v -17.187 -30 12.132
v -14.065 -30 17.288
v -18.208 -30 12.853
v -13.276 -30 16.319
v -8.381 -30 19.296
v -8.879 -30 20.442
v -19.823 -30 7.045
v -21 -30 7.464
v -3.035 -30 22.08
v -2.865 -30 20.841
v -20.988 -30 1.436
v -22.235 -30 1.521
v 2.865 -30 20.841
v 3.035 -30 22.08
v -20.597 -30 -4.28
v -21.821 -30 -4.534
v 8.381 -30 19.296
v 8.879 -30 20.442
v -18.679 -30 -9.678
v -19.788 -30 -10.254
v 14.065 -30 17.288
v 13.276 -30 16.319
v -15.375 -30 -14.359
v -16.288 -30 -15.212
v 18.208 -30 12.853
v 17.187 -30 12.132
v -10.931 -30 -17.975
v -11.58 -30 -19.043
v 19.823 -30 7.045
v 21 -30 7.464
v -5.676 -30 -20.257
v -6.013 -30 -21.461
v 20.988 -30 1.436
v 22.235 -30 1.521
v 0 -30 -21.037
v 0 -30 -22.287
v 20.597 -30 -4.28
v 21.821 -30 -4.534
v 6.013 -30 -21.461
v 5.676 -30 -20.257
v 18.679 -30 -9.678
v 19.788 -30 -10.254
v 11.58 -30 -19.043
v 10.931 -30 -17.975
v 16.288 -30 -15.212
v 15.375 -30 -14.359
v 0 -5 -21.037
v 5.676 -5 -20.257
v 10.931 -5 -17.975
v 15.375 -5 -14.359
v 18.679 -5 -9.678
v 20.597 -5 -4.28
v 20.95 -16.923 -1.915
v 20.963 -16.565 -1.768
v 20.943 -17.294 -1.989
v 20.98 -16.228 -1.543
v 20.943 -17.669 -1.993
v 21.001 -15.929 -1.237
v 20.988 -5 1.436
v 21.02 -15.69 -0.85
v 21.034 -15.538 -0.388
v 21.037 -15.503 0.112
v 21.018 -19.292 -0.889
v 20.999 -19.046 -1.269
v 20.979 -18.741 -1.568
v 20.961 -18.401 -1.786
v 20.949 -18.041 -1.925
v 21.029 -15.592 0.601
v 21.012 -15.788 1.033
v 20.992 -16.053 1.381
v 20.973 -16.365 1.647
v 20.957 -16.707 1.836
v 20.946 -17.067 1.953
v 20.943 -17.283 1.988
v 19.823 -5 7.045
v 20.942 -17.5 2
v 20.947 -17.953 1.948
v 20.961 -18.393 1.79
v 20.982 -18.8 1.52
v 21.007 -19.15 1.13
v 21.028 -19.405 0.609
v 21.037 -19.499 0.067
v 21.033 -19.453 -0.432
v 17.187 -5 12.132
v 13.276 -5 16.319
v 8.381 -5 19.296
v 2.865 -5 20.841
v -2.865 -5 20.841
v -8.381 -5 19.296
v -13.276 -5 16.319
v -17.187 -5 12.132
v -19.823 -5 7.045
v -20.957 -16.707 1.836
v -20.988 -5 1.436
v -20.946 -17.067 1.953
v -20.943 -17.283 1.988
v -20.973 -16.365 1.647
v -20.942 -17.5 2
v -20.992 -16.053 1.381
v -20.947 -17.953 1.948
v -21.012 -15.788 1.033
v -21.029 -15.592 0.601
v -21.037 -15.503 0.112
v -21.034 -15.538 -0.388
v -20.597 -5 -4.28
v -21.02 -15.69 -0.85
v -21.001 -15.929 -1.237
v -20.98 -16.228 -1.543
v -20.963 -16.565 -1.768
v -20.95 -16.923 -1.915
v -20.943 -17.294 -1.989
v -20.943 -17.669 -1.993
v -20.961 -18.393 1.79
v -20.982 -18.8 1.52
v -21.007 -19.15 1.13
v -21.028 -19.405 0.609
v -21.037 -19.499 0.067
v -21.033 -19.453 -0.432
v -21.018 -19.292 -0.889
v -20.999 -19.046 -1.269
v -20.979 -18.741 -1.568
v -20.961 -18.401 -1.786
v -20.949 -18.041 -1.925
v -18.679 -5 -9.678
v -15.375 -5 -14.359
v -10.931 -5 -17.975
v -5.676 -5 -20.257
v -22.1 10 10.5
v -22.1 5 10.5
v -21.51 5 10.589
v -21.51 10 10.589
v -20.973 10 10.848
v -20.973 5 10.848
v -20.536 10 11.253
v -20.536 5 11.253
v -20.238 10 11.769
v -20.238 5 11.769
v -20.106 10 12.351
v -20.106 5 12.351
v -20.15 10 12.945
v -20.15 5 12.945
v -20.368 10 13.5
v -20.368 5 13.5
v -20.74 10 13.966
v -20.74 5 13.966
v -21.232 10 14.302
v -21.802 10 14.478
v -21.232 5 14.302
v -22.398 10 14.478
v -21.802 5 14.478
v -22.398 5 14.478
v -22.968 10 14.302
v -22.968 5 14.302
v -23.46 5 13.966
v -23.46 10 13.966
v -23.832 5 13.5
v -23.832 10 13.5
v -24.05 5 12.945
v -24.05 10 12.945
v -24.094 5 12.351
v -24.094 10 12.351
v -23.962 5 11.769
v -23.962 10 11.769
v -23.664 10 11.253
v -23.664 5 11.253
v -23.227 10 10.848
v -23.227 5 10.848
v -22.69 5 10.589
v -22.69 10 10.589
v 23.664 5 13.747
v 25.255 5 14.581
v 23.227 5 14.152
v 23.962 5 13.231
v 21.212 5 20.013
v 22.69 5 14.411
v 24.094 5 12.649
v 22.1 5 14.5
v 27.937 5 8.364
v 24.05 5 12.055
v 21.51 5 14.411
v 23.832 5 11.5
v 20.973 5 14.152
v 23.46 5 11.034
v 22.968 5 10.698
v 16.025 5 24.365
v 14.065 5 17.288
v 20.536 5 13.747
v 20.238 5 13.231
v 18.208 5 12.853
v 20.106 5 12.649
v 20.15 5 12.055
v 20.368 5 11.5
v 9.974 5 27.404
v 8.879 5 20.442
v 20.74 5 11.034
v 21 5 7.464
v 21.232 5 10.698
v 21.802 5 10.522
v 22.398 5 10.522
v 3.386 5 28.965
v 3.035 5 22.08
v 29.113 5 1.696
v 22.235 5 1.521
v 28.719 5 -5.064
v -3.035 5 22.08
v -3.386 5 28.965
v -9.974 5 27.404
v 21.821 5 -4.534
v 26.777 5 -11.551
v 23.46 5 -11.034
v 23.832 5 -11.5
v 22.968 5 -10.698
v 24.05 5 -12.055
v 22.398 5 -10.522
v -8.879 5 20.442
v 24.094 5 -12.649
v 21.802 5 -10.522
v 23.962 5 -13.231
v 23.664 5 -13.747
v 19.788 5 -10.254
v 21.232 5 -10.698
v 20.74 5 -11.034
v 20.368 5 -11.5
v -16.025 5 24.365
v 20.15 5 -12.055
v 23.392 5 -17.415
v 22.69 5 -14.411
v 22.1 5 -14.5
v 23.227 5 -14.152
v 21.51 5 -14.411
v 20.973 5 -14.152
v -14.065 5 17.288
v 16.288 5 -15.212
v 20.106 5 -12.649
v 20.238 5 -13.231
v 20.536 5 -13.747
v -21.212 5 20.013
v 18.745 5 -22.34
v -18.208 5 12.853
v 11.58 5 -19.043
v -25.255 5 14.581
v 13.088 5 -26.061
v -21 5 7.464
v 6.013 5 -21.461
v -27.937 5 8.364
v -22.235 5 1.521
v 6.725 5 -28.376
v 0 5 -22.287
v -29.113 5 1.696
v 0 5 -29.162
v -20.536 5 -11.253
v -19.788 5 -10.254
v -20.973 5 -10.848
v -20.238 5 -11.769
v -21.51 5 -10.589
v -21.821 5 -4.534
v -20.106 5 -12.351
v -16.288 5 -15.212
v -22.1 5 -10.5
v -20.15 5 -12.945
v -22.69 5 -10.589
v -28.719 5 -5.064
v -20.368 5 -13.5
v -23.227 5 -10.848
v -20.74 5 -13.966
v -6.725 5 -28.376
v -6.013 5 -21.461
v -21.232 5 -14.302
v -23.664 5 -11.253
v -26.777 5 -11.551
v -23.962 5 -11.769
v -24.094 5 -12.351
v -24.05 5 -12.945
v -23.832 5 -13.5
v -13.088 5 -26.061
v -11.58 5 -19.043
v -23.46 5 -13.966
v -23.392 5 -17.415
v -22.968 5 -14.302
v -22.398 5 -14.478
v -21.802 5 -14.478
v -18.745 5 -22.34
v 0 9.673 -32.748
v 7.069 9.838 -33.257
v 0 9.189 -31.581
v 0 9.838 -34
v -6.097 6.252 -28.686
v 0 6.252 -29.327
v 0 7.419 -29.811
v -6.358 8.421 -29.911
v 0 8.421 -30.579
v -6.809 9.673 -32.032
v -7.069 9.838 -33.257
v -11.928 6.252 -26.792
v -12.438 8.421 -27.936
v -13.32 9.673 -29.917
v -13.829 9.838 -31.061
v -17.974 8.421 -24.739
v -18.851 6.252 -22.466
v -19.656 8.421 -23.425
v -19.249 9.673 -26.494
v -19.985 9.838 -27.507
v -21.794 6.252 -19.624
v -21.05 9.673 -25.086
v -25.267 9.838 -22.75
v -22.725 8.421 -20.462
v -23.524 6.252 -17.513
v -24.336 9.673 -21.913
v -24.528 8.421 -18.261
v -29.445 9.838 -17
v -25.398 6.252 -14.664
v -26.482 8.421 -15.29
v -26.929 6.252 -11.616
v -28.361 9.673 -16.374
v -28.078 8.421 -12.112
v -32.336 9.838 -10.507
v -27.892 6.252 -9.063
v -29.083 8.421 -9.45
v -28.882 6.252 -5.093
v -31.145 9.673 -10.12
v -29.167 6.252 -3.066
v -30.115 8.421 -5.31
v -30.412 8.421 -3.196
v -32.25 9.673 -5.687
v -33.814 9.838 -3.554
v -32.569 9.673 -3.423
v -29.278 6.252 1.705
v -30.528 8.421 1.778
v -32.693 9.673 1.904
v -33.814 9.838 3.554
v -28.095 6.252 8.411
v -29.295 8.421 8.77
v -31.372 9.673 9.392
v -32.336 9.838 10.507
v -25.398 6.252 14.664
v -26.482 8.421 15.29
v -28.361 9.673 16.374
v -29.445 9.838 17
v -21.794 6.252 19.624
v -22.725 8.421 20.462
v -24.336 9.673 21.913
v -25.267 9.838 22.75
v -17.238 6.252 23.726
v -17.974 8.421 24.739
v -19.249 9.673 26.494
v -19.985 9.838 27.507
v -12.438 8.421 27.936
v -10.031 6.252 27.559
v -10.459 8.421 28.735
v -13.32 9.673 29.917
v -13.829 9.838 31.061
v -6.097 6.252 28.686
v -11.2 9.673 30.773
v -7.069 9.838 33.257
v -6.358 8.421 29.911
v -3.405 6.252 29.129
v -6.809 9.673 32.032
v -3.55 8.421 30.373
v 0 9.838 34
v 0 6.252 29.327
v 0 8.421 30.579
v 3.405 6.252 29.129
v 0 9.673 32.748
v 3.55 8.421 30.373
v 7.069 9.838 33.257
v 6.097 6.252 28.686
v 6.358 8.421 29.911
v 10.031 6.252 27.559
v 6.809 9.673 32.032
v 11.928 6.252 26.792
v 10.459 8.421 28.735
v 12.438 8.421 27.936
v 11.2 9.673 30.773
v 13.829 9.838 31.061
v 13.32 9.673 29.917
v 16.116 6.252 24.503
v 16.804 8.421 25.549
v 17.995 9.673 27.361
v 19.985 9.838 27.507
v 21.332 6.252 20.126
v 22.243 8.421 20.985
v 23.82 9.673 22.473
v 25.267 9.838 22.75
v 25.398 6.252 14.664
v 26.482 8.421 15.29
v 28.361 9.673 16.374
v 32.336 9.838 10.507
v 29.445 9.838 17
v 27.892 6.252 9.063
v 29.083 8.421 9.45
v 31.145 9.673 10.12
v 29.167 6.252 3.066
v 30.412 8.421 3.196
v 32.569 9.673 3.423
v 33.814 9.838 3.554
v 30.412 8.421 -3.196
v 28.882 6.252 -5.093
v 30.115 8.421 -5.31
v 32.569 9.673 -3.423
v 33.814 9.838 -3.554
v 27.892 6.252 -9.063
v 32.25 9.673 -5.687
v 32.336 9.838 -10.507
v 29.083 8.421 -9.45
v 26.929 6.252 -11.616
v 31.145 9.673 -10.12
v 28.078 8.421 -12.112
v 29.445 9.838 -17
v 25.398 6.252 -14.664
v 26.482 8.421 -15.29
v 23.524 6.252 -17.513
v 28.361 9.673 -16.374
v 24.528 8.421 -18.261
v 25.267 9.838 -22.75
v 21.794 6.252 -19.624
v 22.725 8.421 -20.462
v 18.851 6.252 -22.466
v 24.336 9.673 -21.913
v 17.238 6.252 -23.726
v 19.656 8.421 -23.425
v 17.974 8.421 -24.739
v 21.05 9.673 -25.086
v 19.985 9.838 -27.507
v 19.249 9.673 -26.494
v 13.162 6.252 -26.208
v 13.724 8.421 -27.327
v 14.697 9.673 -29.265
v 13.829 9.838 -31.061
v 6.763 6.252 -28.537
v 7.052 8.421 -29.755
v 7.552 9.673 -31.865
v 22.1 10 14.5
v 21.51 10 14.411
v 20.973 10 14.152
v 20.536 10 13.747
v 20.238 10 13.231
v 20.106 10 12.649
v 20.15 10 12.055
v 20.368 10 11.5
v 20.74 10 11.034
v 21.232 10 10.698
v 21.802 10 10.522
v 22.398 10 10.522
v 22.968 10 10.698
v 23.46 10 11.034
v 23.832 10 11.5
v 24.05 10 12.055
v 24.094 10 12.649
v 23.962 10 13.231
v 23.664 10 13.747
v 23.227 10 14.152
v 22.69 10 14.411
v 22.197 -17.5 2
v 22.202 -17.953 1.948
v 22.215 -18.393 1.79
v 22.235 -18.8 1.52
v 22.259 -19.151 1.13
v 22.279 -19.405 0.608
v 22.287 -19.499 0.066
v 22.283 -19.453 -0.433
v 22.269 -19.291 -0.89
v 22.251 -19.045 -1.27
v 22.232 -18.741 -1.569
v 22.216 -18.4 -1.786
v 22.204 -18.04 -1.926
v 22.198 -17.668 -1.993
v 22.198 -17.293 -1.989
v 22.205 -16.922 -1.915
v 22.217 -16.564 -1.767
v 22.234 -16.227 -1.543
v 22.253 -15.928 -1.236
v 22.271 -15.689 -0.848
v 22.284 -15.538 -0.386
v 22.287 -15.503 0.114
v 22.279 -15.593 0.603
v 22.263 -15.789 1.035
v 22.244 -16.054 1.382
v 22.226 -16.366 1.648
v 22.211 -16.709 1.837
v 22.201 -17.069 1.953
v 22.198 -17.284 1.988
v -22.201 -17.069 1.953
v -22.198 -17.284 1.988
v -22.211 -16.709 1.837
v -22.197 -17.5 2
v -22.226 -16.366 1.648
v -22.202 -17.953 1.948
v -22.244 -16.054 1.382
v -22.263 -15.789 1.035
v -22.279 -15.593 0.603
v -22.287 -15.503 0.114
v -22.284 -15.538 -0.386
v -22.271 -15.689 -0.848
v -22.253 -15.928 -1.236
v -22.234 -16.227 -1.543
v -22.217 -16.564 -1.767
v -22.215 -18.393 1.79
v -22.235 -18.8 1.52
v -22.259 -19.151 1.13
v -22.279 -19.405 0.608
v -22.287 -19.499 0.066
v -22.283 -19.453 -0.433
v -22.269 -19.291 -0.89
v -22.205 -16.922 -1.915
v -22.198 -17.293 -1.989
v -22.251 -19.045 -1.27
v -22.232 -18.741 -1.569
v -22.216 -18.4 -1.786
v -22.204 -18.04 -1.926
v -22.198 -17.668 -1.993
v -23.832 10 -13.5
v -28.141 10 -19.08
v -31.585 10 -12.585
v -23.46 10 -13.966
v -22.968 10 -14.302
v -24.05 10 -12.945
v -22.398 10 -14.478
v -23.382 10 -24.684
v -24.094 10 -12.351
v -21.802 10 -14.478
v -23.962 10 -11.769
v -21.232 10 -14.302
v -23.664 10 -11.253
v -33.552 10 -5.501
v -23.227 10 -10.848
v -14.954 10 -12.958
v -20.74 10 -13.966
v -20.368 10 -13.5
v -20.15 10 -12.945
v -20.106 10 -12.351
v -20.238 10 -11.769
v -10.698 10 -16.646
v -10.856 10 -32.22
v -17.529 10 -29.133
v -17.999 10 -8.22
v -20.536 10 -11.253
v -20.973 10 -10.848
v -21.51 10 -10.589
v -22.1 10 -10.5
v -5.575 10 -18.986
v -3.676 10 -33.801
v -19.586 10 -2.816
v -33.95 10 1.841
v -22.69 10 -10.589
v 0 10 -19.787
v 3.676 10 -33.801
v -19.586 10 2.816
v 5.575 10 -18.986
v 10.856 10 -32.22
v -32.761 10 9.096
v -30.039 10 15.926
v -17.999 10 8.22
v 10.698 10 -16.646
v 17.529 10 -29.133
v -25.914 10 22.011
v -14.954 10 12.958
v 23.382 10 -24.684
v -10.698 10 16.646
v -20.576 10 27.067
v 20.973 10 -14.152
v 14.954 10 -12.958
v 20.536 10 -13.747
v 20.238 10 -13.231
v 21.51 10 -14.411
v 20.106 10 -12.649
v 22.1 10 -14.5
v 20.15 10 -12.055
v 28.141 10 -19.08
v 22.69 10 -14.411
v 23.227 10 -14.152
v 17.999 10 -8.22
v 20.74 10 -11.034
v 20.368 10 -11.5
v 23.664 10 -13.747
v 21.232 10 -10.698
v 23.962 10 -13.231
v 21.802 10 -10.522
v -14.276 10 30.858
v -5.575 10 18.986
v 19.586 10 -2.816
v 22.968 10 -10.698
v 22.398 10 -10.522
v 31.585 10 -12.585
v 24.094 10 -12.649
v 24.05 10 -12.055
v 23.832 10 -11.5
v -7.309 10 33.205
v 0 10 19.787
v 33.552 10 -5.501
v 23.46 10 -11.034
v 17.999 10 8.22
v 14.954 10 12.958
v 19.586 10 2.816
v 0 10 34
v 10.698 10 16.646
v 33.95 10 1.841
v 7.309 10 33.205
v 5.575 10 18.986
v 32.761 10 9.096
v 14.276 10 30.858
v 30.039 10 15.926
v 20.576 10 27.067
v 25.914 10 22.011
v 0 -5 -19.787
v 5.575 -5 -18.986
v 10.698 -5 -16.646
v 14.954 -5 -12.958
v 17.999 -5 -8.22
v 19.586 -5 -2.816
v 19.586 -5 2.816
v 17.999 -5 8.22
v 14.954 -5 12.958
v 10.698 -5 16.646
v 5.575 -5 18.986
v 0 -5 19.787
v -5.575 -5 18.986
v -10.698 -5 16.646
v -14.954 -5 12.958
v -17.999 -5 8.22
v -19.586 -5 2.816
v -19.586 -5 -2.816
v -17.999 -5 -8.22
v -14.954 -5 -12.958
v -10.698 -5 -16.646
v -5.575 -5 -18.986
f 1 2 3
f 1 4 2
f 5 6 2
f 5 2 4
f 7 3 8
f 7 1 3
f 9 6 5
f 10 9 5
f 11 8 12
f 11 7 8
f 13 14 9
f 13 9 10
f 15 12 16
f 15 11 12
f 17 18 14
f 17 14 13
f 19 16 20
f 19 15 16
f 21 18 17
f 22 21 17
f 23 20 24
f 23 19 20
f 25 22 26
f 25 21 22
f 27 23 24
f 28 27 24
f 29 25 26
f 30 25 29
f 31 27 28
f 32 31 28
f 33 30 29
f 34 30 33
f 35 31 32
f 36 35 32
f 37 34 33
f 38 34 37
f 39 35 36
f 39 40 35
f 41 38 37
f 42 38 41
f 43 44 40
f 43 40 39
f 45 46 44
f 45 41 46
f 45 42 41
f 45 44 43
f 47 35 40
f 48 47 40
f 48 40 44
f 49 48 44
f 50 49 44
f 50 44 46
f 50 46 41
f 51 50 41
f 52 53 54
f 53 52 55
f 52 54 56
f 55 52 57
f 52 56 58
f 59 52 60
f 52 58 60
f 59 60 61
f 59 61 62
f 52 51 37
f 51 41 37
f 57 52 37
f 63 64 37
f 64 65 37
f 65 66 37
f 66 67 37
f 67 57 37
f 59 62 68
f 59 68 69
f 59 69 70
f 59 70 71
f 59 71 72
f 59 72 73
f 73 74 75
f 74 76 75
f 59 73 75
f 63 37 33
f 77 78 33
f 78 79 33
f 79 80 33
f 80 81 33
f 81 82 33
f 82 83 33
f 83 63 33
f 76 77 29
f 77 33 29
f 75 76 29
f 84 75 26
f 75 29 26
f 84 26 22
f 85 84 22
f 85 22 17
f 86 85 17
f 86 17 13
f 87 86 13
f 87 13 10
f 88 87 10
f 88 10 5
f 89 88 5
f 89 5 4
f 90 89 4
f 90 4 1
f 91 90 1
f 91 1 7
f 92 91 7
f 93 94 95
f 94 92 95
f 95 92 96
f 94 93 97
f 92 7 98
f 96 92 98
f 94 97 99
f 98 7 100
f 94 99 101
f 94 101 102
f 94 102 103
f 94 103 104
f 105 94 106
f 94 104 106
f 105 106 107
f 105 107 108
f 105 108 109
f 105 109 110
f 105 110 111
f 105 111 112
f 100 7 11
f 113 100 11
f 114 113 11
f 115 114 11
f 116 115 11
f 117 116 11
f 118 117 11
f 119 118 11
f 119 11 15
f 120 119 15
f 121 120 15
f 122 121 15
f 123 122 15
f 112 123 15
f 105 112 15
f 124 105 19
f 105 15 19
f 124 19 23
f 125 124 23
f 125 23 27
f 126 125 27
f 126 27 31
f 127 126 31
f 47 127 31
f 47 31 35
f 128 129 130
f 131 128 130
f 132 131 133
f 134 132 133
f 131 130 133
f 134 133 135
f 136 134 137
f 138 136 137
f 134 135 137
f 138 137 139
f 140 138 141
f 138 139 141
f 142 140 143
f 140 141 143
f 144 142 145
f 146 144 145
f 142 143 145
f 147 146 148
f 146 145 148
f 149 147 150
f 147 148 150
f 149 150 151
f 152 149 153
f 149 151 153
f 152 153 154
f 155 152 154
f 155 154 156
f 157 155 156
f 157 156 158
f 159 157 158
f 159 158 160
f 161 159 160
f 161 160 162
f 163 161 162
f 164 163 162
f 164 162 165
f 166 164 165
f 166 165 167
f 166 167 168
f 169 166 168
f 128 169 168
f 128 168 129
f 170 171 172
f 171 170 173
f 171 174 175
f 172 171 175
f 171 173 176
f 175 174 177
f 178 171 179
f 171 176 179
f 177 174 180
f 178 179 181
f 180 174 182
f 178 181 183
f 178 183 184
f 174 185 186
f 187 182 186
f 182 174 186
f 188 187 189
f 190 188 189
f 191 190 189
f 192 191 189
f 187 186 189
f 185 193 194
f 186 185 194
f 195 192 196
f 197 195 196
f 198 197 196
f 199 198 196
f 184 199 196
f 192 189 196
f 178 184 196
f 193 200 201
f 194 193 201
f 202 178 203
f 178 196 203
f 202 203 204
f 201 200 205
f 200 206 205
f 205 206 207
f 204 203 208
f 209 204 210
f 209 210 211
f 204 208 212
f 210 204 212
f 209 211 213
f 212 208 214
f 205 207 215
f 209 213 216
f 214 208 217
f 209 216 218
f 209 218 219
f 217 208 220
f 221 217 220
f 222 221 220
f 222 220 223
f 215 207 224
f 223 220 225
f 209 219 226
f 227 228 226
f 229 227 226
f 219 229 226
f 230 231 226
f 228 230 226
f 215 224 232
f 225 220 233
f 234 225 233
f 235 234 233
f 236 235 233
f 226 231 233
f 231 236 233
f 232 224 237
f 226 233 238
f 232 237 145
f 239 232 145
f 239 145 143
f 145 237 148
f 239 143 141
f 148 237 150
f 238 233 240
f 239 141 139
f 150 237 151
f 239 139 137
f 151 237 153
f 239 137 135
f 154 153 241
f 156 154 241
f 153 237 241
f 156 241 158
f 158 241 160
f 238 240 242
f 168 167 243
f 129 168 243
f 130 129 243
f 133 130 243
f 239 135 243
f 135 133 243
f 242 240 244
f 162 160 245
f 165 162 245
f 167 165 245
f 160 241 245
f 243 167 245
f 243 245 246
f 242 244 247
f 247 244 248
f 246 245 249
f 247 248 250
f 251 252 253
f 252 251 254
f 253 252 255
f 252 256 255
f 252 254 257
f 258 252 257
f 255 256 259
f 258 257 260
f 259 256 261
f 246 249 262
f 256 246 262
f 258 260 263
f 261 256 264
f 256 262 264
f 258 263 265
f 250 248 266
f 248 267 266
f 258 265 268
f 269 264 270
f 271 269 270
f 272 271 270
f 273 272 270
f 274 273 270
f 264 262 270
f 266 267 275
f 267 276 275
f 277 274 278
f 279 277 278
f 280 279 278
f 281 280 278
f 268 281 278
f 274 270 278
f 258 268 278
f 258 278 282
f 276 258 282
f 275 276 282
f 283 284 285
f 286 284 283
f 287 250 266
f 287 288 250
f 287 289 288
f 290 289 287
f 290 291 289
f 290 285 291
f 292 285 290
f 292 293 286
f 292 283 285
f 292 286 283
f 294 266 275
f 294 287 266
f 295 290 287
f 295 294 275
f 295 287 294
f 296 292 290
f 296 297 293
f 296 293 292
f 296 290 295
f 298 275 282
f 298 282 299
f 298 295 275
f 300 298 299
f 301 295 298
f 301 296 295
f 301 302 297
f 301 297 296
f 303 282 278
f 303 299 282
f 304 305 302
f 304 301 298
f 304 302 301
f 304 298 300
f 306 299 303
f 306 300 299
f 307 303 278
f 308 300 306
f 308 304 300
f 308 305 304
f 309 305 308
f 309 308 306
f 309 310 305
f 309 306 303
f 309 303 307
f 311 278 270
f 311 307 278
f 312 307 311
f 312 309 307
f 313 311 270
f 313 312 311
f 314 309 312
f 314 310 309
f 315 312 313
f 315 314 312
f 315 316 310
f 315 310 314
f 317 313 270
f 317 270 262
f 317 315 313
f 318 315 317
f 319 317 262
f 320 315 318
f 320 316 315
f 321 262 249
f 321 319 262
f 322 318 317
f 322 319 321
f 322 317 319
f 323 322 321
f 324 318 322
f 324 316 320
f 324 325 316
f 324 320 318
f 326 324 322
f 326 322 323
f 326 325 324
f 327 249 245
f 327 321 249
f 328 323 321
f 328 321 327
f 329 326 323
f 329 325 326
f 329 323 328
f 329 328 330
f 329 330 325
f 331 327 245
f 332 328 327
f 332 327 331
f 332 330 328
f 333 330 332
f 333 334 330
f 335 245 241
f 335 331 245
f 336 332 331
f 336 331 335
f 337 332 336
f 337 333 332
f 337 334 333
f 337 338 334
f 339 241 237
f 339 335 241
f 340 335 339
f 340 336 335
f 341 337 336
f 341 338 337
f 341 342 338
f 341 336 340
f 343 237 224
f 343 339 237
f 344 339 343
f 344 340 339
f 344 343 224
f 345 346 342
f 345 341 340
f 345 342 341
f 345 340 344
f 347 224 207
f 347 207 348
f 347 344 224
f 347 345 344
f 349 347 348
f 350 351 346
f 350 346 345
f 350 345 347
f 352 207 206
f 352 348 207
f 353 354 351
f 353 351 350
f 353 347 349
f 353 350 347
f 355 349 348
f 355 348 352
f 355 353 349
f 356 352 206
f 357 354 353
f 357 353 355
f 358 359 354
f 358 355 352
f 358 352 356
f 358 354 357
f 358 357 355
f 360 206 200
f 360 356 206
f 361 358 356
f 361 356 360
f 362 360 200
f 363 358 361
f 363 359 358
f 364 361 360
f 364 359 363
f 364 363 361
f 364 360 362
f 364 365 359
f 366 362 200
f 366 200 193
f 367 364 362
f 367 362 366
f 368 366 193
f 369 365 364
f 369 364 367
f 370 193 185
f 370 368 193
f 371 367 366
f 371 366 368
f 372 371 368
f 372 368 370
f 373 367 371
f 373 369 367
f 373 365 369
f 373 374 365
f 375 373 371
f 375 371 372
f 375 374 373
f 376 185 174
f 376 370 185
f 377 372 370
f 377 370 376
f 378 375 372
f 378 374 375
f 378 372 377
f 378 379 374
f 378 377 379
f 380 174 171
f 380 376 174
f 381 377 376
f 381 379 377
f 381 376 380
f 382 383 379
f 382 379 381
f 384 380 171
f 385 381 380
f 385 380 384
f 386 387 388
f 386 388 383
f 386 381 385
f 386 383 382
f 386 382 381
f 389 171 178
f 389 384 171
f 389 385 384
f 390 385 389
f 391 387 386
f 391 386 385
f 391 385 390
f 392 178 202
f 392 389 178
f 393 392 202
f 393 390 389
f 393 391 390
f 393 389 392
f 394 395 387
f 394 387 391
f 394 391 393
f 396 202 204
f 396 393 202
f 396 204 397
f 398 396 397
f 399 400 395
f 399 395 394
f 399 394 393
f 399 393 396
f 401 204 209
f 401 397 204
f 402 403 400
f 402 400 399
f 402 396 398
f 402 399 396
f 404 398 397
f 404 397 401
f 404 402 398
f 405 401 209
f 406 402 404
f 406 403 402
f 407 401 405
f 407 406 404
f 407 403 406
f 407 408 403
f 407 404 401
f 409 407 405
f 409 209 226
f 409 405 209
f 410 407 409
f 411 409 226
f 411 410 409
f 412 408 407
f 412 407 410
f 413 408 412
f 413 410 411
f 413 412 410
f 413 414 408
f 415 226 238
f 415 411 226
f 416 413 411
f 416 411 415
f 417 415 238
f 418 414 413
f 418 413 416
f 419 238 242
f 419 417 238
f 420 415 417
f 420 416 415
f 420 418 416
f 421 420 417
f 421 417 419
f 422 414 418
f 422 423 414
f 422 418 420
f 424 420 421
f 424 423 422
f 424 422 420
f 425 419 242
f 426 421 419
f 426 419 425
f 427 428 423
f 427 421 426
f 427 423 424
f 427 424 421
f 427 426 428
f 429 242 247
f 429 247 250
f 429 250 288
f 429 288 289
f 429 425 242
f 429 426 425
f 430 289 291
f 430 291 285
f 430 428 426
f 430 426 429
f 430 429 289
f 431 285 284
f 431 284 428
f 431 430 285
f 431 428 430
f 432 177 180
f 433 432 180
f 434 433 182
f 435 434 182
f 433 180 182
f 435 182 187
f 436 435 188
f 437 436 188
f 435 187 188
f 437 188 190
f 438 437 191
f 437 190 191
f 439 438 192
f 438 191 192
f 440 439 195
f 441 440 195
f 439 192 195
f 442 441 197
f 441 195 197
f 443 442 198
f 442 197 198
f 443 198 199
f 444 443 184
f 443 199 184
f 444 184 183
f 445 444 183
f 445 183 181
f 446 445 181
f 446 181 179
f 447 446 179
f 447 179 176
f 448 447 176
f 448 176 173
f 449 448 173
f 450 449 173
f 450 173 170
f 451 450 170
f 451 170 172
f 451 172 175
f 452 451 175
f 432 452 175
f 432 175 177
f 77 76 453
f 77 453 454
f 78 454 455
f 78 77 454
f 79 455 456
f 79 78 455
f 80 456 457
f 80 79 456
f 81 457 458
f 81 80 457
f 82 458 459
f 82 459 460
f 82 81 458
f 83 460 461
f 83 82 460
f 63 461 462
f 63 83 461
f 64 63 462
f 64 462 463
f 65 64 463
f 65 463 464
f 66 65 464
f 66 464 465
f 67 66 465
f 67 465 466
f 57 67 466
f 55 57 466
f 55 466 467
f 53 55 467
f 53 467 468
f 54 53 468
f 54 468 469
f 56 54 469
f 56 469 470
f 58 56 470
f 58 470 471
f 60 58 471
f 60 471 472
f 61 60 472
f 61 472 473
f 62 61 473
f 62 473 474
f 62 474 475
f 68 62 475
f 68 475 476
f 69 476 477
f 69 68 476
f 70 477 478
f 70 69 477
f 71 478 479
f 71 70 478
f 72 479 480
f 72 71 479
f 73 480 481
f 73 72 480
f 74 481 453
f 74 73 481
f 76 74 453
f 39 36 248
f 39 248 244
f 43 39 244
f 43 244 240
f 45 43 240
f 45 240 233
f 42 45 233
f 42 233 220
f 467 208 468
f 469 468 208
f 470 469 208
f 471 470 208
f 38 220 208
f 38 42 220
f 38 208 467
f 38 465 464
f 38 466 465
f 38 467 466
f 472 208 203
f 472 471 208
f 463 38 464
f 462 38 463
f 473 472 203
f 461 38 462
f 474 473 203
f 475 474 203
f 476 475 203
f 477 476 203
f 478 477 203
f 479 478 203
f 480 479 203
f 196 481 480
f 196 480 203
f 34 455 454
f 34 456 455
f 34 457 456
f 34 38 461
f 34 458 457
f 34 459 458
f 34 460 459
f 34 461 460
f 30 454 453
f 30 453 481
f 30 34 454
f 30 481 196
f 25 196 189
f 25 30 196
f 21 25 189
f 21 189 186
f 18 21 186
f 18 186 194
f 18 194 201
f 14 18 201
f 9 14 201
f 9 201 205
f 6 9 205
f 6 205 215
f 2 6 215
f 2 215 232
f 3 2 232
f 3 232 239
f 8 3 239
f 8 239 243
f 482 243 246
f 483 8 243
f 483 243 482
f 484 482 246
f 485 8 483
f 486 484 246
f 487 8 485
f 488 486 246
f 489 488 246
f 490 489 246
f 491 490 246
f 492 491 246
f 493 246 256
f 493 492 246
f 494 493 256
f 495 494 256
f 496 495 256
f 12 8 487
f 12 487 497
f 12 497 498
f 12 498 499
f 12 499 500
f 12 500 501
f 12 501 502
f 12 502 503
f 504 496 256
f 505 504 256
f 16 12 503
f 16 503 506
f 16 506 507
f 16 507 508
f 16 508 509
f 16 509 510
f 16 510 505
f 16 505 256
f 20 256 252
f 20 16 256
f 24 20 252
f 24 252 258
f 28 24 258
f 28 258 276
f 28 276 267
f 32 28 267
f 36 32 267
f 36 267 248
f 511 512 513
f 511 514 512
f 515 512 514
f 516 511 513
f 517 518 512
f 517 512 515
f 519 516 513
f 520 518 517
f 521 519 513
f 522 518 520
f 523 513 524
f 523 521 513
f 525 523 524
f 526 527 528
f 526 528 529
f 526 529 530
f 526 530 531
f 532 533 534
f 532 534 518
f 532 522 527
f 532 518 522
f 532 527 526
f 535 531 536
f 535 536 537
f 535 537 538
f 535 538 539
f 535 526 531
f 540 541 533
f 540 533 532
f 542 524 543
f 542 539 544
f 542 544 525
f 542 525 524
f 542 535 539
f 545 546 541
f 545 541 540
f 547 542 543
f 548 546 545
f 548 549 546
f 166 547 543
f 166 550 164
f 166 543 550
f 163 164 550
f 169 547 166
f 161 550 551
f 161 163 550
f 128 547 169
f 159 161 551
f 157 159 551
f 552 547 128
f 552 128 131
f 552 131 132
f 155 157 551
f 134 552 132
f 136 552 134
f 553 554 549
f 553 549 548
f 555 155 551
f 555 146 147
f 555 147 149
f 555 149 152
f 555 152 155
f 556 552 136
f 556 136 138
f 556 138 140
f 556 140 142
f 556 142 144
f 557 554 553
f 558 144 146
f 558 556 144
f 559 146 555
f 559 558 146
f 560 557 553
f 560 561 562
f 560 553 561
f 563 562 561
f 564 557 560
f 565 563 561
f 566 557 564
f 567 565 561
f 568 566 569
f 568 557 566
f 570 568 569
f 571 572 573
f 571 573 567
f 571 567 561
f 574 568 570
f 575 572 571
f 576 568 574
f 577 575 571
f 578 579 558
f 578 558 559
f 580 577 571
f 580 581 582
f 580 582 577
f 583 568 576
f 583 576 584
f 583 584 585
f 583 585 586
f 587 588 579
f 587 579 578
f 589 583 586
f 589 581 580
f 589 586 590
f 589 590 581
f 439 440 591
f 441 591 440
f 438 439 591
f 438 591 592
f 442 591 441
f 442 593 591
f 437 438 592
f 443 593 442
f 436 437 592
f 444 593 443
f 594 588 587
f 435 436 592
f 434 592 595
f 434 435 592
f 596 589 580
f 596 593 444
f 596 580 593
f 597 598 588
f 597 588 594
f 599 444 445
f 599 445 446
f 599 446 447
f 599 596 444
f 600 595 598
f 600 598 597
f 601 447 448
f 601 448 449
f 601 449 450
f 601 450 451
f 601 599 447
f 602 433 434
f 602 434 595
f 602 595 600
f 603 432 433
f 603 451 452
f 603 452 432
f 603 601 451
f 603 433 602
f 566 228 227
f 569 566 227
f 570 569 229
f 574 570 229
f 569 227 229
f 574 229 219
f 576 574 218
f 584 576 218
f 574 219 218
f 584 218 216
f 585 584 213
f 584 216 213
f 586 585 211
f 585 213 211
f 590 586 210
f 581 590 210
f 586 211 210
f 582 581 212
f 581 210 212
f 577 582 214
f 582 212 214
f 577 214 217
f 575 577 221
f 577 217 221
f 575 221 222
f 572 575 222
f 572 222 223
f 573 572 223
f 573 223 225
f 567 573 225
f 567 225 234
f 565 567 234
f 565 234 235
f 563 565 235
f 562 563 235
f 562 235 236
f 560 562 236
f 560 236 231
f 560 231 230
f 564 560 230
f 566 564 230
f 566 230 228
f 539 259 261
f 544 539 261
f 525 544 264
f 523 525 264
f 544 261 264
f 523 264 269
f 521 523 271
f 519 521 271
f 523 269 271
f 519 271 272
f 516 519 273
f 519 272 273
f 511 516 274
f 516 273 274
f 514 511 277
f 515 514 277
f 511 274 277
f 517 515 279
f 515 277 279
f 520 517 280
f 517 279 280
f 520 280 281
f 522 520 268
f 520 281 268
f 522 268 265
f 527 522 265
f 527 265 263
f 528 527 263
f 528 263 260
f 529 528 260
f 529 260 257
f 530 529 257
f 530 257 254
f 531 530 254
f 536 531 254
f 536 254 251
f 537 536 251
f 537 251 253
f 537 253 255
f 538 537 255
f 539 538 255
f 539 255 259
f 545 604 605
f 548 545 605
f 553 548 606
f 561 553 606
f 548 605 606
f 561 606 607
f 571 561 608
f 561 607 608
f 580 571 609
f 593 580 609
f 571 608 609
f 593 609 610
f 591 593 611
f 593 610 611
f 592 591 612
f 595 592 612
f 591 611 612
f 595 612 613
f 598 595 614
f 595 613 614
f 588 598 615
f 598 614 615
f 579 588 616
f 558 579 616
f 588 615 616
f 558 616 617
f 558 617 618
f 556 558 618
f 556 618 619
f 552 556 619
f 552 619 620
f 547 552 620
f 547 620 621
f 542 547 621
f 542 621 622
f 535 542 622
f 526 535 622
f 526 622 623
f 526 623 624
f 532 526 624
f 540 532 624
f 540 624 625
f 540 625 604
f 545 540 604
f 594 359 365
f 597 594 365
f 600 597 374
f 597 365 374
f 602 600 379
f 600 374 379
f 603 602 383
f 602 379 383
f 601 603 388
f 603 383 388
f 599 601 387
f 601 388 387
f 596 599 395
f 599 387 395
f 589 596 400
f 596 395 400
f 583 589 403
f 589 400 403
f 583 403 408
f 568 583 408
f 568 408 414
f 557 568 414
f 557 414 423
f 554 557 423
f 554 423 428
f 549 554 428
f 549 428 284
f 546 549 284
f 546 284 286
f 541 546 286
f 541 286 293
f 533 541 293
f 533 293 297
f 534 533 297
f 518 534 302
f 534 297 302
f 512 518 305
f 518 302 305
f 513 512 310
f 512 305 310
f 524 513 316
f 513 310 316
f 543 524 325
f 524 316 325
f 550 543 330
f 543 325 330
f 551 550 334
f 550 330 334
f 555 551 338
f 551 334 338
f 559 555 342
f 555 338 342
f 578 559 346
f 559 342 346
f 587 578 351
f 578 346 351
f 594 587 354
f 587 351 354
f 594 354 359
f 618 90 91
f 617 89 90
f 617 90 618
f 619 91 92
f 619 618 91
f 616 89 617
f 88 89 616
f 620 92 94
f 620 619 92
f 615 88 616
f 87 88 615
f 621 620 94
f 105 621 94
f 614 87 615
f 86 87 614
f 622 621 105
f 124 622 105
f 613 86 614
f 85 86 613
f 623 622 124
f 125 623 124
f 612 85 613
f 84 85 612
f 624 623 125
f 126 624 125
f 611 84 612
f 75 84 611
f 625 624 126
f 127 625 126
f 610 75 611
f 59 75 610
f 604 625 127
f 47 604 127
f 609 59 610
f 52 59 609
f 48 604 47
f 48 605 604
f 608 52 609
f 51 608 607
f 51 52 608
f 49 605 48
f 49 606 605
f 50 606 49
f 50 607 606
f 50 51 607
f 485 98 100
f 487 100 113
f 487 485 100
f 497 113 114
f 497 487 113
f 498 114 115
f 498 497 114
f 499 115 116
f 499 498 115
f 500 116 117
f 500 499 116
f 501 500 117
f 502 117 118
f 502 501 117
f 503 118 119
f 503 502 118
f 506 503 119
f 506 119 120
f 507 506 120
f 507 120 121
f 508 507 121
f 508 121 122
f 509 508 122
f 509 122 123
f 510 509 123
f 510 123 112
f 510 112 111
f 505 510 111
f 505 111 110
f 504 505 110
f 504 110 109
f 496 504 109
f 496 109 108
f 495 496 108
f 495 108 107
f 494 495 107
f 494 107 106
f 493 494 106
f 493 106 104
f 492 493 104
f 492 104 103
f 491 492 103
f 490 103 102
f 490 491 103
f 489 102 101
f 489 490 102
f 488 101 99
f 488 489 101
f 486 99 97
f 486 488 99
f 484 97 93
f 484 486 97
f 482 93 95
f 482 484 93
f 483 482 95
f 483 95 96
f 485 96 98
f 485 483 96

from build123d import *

# Parameters (mm, degrees)
SKETCH1_R               = 34
BOSS_EXTRUDE1_DEPTH     = 10
SKETCH2_R               = 19.7871926
SKETCH2_R_2             = 2
CUT_EXTRUDE1_DEPTH      = 10
SKETCH3_R               = 4.837531333
SKETCH4_W               = 4.837531333
SKETCH4_H               = 4.837531333
CUT_EXTRUDE3_DEPTH      = 38
CUT_EXTRUDE3_DEPTH_BACK = 38
SKETCH5_W               = 72.361656805
SKETCH5_H               = 8.896778435
BOSS_EXTRUDE2_START     = 35
SKETCH6_R               = 22.2871926
SKETCH6_R_2             = 19.7871926
BOSS_EXTRUDE2_DEPTH     = 35
SKETCH7_R               = 21.0371926
SKETCH7_R_2             = 19.7871926
CUT_EXTRUDE4_DEPTH      = 25
CUT_EXTRUDE5_DEPTH      = 59
CUT_EXTRUDE5_DEPTH_BACK = 45
SKETCH9_R               = 2


with BuildPart() as part:
    # Sketch1 → Boss-Extrude1 (new body)
    with BuildSketch(Plane(origin=(0, 0, 0), x_dir=(1, 0, 0), z_dir=(0, 1, 0))):
        Circle(SKETCH1_R)
    extrude(amount=BOSS_EXTRUDE1_DEPTH)

    # Sketch2 → Cut-Extrude1 (cut)
    with BuildSketch(Plane.XZ):
        Circle(SKETCH2_R)
        with Locations((-22.1, 12.5)):
            Circle(SKETCH2_R_2)
        with Locations((22.1, 12.5)):
            Circle(SKETCH2_R_2)
        with Locations((22.1, -12.5)):
            Circle(SKETCH2_R_2)
        with Locations((-22.1, -12.5)):
            Circle(SKETCH2_R_2)
    extrude(amount=-CUT_EXTRUDE1_DEPTH, mode=Mode.SUBTRACT)

    # Sketch3 → Cut-Revolve1 (revolve, cut)
    with BuildSketch(Plane(origin=(0, 0, 0), x_dir=(0, 0, -1), z_dir=(1, 0, 0))):
        with Locations((-34, 5)):
            Circle(SKETCH3_R)
    revolve(axis=Axis((0, 0, 0), (0, 1, 0)), mode=Mode.SUBTRACT)

    # Sketch4 → Cut-Revolve2 (revolve, cut)
    with BuildSketch(Plane(origin=(0, 0, 0), x_dir=(0, 0, -1), z_dir=(1, 0, 0))):
        with Locations((-31.581234333, 2.581234333)):
            Rectangle(SKETCH4_W, SKETCH4_H)
    revolve(axis=Axis((0, 0, 0), (0, 1, 0)), mode=Mode.SUBTRACT)

    # Sketch5 → Cut-Extrude3 (cut, two sides: drawn at the far end of the back side and taken through both)
    with BuildSketch(Plane(origin=(0, 0, 0), x_dir=(0, 0, -1), z_dir=(1, 0, 0)).offset(-CUT_EXTRUDE3_DEPTH_BACK)):
        with Locations((-0.901301775, 0.551610782)):
            Rectangle(SKETCH5_W, SKETCH5_H)
    extrude(amount=CUT_EXTRUDE3_DEPTH + CUT_EXTRUDE3_DEPTH_BACK, mode=Mode.SUBTRACT)

    # Sketch6 → Boss-Extrude2 (add)
    with BuildSketch(Plane.XZ.offset(-5).offset(BOSS_EXTRUDE2_START)):
        Circle(SKETCH6_R)
        Circle(SKETCH6_R_2, mode=Mode.SUBTRACT)
    extrude(amount=-BOSS_EXTRUDE2_DEPTH)

    # Sketch7 → Cut-Extrude4 (cut)
    with BuildSketch(Plane.XZ.offset(30)):
        Circle(SKETCH7_R)
        Circle(SKETCH7_R_2, mode=Mode.SUBTRACT)
    extrude(amount=-CUT_EXTRUDE4_DEPTH, mode=Mode.SUBTRACT)

    # Sketch9 → Cut-Extrude5 (cut, two sides: drawn at the far end of the back side and taken through both)
    with BuildSketch(Plane(origin=(0, 0, 0), x_dir=(0, 0, -1), z_dir=(1, 0, 0)).offset(-CUT_EXTRUDE5_DEPTH_BACK)):
        with Locations((0, -17.5)):
            Circle(SKETCH9_R)
    extrude(amount=CUT_EXTRUDE5_DEPTH + CUT_EXTRUDE5_DEPTH_BACK, mode=Mode.SUBTRACT)


solid = part.part
